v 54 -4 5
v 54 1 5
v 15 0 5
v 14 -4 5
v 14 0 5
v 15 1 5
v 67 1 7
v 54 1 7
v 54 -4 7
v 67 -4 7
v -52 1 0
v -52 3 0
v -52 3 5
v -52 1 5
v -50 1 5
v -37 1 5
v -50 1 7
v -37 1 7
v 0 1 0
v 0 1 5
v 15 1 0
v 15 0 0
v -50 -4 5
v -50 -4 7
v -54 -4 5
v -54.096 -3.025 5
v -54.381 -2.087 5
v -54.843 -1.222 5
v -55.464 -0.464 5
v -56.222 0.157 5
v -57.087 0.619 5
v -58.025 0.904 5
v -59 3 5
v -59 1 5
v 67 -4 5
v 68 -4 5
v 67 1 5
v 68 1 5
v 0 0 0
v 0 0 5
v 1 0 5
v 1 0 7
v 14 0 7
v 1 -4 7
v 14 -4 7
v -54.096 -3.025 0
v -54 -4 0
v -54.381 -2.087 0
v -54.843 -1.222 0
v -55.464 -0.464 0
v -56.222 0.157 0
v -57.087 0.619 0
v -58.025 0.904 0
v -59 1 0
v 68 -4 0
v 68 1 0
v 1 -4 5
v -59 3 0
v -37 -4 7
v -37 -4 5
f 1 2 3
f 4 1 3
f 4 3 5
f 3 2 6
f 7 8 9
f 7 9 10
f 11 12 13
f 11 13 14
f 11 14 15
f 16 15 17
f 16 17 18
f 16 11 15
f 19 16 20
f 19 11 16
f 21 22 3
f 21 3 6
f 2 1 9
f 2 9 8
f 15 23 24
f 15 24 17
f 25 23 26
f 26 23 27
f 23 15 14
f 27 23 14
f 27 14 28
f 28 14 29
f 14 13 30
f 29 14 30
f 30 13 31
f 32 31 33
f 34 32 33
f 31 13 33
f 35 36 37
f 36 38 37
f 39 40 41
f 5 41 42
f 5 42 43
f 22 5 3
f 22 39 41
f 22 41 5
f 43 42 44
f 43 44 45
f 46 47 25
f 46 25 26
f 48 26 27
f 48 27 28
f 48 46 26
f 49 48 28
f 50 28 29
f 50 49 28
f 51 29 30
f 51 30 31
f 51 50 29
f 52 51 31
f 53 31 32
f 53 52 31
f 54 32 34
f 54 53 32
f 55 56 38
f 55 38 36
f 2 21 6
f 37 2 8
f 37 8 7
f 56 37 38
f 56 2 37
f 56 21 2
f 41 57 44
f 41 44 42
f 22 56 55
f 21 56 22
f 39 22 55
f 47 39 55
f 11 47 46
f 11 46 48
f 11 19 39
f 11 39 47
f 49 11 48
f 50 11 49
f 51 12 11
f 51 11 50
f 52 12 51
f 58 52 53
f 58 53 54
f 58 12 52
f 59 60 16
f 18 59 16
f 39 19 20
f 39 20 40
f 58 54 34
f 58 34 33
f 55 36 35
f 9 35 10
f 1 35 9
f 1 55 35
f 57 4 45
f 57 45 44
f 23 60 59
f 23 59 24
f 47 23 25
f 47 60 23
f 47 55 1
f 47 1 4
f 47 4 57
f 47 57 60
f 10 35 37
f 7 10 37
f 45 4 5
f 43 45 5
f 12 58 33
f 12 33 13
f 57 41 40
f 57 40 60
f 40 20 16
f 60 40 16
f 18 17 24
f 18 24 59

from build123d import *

# Parameters (mm, degrees)
BOSS_EXTRU_1_DEPTH = 5
ESQUISSE3_W        = 13
ESQUISSE3_H        = 5
ESQUISSE3_H_2      = 4
BOSS_EXTRU_2_DEPTH = 2


with BuildPart() as part:
    # Base pièce → Boss.-Extru.1 (new body)
    with BuildSketch(Plane.XY):
        with BuildLine():
            Line((0, 0), (15, 0))
            Line((15, 0), (15, 1))
            Line((15, 1), (68, 1))
            Line((68, 1), (68, -4))
            Line((68, -4), (-54, -4))
            ThreePointArc((-54, -4), (-55.464466094, -0.464466094), (-59, 1))
            Line((-59, 1), (-59, 3))
            Line((-59, 3), (-52, 3))
            Line((-52, 3), (-52, 1))
            Line((-52, 1), (0, 1))
            Line((0, 1), (0, 0))
        make_face()
    extrude(amount=BOSS_EXTRU_1_DEPTH)

    # Esquisse3 → Boss.-Extru.2 (add)
    with BuildSketch(Plane.XY.offset(5)):
        with Locations((-43.5, -1.5)):
            Rectangle(ESQUISSE3_W, ESQUISSE3_H)
        with Locations((7.5, -2)):
            Rectangle(ESQUISSE3_W, ESQUISSE3_H_2)
        with Locations((60.5, -1.5)):
            Rectangle(ESQUISSE3_W, ESQUISSE3_H)
    extrude(amount=BOSS_EXTRU_2_DEPTH)


solid = part.part
